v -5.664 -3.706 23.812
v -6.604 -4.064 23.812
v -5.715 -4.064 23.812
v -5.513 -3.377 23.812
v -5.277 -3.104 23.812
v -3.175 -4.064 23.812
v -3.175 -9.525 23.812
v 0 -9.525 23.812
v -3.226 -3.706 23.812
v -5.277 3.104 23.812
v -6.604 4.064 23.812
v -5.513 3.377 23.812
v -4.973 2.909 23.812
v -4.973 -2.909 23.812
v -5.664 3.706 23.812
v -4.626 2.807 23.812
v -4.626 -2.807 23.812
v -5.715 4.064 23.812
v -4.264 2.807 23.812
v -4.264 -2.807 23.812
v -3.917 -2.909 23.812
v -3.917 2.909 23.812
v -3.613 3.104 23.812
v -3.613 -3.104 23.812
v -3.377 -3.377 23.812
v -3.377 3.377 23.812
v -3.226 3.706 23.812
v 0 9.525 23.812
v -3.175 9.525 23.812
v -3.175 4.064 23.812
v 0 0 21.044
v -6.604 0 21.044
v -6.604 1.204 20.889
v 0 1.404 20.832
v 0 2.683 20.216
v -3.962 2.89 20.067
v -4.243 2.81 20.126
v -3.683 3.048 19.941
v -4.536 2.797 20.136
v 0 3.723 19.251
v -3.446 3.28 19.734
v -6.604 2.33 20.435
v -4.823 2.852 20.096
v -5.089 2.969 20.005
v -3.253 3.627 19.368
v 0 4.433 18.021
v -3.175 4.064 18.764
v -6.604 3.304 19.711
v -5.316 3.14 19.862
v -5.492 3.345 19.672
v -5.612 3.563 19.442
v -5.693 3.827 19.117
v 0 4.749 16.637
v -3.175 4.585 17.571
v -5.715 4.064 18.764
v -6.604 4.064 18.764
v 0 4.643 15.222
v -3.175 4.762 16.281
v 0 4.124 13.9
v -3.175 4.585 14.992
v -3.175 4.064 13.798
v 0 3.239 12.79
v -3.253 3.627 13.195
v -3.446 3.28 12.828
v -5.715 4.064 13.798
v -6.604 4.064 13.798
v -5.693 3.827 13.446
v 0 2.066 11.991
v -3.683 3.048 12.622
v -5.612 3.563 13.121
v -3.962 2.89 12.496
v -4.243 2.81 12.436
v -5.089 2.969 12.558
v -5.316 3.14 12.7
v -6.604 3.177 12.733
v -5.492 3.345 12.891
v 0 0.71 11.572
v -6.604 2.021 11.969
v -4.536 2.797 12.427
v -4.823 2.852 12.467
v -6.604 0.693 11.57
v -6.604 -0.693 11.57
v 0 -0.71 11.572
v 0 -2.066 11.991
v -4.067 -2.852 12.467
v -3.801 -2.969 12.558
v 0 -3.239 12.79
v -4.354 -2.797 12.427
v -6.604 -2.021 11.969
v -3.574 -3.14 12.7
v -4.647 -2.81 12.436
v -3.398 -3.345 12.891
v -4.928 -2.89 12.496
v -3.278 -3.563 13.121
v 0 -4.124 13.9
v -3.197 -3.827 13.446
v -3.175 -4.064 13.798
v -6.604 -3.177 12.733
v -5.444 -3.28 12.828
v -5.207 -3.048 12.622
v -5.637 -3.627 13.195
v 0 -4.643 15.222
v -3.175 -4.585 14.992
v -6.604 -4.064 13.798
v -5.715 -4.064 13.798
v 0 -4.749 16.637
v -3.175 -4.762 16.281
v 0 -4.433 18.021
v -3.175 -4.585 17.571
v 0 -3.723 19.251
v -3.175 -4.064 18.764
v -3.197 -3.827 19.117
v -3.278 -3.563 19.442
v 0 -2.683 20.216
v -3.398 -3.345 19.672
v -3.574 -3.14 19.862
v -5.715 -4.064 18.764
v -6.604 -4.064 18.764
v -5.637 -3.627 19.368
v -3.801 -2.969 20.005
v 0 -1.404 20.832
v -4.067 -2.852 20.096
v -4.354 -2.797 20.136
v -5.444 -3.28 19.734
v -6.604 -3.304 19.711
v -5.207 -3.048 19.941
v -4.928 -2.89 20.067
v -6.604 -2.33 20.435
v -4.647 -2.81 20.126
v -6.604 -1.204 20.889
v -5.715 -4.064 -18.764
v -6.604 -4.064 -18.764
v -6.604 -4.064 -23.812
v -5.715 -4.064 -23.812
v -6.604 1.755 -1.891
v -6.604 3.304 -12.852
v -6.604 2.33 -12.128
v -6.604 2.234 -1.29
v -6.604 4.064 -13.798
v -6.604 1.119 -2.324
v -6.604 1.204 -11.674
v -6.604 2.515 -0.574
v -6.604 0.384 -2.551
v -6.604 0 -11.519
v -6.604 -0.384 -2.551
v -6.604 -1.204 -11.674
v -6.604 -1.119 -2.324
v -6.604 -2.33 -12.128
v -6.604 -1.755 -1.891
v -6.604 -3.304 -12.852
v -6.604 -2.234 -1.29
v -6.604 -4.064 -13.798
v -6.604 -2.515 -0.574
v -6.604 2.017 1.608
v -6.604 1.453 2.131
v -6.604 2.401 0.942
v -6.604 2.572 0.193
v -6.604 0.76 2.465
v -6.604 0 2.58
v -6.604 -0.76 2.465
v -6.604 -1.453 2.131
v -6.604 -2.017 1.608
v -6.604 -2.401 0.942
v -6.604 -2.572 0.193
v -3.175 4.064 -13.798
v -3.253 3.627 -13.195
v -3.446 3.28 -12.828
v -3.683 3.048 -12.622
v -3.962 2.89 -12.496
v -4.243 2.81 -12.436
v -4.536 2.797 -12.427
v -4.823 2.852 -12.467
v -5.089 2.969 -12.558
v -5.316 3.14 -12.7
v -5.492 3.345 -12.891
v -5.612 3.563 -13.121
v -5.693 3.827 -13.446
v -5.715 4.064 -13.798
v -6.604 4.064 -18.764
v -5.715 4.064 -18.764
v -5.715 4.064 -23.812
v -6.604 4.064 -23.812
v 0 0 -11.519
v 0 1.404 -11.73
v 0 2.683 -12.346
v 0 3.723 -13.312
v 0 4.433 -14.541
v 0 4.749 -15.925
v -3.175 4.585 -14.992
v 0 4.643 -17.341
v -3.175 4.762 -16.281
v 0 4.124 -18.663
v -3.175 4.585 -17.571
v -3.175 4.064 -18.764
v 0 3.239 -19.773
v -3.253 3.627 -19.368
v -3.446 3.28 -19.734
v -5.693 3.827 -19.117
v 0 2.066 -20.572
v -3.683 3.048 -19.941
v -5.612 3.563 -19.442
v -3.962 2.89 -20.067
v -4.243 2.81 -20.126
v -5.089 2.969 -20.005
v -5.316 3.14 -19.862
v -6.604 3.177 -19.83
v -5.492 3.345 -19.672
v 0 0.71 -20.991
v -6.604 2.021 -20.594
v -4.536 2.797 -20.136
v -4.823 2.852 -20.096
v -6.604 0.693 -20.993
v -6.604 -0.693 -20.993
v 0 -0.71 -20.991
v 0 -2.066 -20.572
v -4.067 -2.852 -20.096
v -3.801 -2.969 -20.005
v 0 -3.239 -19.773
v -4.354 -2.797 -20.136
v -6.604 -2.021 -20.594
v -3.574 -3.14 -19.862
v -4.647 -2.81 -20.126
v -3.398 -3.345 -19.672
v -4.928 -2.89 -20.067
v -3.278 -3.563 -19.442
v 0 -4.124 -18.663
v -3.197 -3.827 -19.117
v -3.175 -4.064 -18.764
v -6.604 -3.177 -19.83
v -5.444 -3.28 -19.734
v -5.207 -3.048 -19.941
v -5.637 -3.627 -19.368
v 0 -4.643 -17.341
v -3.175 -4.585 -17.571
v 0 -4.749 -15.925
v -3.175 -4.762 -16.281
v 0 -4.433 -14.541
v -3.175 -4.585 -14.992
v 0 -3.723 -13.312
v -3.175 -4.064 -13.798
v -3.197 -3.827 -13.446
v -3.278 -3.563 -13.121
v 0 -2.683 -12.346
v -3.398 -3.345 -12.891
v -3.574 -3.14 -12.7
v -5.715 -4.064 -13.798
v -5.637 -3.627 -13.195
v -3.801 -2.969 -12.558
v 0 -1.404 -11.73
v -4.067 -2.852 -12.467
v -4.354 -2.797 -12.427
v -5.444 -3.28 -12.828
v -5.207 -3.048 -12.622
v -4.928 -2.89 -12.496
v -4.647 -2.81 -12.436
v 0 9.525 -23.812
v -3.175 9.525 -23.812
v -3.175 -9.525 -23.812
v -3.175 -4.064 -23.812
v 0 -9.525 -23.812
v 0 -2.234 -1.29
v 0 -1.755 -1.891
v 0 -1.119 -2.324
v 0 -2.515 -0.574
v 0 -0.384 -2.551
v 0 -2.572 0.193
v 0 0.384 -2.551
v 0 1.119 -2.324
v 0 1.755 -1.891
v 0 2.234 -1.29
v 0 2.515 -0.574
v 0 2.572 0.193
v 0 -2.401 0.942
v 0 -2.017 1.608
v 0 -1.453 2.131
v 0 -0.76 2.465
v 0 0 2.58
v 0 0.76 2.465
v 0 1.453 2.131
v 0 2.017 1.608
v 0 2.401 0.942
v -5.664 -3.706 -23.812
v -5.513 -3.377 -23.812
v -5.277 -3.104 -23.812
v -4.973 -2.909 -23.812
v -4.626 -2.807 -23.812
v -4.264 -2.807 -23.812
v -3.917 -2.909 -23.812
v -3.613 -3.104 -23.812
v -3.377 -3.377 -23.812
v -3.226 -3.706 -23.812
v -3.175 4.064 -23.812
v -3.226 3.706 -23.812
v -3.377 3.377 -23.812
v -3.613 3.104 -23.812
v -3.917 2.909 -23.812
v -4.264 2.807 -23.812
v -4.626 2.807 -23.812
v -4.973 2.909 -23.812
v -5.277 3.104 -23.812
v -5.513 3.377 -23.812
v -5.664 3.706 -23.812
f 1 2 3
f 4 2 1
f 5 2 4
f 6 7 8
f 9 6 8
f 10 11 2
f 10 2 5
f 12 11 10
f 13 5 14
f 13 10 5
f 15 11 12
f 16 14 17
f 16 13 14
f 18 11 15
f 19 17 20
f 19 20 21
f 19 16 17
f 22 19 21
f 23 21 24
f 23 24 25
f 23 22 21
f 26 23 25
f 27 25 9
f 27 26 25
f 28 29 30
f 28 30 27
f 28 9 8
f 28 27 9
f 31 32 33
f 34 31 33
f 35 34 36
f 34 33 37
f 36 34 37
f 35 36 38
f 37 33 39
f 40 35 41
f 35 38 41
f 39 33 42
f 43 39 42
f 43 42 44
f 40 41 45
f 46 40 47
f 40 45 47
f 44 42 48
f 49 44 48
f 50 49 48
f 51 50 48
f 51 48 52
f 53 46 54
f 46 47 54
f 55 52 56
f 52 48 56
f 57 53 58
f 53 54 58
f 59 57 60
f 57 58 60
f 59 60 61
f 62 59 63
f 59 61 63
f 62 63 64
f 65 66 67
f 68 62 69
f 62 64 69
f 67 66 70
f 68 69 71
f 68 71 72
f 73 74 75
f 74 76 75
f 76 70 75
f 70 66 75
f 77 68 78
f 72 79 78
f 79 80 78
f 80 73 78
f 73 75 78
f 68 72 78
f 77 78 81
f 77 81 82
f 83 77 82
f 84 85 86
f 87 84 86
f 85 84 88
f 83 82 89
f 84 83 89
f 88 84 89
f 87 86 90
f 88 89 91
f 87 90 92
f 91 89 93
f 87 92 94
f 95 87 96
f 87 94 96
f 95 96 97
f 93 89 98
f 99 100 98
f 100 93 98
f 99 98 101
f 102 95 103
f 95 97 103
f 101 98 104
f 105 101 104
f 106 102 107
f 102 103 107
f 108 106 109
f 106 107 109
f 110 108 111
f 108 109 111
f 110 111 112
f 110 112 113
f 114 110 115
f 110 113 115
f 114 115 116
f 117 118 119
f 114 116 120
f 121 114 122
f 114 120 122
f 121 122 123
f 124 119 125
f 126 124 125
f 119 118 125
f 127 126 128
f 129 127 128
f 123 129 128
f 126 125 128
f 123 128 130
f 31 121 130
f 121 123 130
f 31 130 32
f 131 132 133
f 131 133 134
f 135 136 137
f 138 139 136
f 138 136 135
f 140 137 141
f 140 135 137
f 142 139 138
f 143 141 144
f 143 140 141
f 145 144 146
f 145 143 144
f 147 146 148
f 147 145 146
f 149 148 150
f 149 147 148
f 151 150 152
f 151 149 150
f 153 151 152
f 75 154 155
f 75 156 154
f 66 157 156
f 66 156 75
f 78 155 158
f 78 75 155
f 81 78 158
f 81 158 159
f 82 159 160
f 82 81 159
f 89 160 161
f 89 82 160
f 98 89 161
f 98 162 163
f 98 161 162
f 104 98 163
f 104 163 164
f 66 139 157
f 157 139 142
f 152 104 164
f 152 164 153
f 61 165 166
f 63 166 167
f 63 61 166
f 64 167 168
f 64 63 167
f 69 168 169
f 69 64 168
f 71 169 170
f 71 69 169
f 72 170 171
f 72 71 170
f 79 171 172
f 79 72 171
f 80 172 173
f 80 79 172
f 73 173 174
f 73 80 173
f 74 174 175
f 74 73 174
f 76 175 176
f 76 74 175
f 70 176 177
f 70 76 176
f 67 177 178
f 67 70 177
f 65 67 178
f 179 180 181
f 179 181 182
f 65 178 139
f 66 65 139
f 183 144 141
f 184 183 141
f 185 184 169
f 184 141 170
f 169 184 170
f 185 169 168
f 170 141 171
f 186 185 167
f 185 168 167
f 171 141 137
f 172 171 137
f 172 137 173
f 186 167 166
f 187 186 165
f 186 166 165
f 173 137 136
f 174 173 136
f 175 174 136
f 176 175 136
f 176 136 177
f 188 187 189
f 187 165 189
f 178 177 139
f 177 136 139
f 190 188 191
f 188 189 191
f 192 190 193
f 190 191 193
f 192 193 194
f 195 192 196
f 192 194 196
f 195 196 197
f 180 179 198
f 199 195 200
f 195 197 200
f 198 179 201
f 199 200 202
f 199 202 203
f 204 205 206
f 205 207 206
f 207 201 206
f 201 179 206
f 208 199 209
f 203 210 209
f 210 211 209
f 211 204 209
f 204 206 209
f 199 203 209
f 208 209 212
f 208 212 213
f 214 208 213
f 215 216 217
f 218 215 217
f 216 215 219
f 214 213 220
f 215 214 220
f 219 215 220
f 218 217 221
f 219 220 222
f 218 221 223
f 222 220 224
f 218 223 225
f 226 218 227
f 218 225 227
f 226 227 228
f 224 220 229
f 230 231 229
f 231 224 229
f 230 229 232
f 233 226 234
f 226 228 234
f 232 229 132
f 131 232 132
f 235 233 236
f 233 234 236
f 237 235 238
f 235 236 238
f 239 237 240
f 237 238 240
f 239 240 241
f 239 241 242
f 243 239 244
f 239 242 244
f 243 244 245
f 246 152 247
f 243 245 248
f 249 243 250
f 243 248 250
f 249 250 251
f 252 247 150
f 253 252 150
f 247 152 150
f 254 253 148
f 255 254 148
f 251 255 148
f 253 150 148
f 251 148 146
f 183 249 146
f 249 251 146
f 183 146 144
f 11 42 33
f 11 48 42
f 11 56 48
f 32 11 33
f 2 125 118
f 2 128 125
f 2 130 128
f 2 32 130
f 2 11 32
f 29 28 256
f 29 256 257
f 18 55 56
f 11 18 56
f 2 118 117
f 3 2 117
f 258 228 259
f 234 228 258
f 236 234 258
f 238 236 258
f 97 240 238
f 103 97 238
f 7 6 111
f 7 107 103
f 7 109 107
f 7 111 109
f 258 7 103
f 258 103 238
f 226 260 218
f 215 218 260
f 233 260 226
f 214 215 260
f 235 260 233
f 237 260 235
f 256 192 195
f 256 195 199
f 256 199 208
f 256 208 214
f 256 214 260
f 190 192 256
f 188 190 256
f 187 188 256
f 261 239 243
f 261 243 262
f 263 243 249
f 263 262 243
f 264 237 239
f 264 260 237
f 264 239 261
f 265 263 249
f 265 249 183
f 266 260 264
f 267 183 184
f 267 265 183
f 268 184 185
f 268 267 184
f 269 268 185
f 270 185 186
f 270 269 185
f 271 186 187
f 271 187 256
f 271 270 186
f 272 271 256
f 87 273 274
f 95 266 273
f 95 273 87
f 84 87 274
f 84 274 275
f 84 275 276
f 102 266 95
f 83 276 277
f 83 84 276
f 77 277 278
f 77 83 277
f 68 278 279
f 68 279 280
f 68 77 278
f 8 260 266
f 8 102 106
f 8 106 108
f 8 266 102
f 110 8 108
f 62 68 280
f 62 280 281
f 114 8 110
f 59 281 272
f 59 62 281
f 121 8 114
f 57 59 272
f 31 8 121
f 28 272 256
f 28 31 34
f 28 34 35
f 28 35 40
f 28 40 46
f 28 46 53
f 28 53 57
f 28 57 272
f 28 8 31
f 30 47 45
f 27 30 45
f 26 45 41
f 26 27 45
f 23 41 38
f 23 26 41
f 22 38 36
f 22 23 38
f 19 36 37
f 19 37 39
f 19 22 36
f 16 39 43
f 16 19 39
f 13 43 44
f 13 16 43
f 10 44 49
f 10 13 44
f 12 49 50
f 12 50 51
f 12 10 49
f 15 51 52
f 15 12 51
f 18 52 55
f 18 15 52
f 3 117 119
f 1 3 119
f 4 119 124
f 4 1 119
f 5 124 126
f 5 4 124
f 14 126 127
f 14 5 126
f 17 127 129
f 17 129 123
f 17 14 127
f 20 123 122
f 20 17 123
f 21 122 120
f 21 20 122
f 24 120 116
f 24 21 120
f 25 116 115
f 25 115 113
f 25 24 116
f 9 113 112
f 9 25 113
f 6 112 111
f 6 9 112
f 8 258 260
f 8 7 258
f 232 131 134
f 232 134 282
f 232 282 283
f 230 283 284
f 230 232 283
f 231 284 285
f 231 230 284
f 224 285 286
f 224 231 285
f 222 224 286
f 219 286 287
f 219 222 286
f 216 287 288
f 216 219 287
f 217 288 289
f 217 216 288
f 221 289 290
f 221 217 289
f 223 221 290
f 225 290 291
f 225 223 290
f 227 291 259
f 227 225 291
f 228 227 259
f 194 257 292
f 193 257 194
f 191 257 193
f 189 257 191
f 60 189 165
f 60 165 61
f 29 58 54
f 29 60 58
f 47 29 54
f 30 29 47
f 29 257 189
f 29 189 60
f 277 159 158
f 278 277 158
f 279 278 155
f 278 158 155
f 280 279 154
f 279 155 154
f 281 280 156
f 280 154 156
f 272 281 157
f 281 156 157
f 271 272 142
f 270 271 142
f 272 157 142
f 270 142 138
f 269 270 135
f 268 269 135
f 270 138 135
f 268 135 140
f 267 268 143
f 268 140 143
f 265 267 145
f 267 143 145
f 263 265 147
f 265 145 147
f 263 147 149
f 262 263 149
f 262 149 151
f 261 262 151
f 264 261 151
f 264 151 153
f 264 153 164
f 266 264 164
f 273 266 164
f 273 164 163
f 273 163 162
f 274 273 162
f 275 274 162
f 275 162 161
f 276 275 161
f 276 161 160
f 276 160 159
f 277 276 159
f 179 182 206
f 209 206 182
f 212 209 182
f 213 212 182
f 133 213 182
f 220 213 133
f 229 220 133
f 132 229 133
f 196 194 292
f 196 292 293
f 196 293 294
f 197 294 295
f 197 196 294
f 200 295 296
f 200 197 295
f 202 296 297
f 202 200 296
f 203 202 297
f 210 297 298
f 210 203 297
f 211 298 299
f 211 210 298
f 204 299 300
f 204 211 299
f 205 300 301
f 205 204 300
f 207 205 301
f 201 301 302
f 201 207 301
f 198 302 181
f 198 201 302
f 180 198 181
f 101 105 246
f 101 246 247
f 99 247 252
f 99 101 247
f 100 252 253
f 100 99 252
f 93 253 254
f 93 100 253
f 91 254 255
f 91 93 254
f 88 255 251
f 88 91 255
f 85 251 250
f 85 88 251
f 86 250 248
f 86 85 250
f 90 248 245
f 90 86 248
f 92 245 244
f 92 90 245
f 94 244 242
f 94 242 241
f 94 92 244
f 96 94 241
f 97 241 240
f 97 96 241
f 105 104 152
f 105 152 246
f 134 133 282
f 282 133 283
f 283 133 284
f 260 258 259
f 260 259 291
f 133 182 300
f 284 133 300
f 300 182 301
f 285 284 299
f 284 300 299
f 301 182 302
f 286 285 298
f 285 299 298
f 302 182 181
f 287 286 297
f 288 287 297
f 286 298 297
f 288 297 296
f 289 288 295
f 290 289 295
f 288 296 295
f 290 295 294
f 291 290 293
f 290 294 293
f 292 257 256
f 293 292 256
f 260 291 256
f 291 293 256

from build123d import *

# Parameters (mm, degrees)
BOSS_EXTRUDE1_DEPTH = 23.8125
SKETCH2_R           = 2.5796875
CUT_EXTRUDE1_DEPTH  = 7.604
SKETCH3_R           = 4.7625
CUT_EXTRUDE2_DEPTH  = 7.604


with BuildPart() as part:
    # Sketch1 → Boss-Extrude1 (new body, symmetric)
    with BuildSketch(Plane.XY):
        with BuildLine():
            Line((0, -9.525), (0, 9.525))
            Line((0, 9.525), (-3.175, 9.525))
            Line((-3.175, 9.525), (-3.175, 4.064))
            ThreePointArc((-3.175, 4.064), (-4.445, 2.794), (-5.715, 4.064))
            Line((-5.715, 4.064), (-6.604, 4.064))
            Line((-6.604, 4.064), (-6.604, -4.064))
            Line((-6.604, -4.064), (-5.715, -4.064))
            ThreePointArc((-5.715, -4.064), (-4.445, -2.794), (-3.175, -4.064))
            Line((-3.175, -4.064), (-3.175, -9.525))
            Line((-3.175, -9.525), (0, -9.525))
        make_face()
    extrude(amount=BOSS_EXTRUDE1_DEPTH, both=True)

    # Sketch2 → Cut-Extrude1 (cut, through all)
    with BuildSketch(Plane.ZY.offset(6.604)):
        with Locations((16.2814, 0)):
            Circle(SKETCH2_R)
        with Locations((-16.2814, 0)):
            Circle(SKETCH2_R)
        Circle(SKETCH2_R)
    extrude(amount=-CUT_EXTRUDE1_DEPTH, mode=Mode.SUBTRACT)

    # Sketch3 → Cut-Extrude2 (cut, through all)
    with BuildSketch(Plane.ZY.offset(6.604)):
        with Locations((-16.2814, 0)):
            Circle(SKETCH3_R)
        with Locations((16.2814, 0)):
            Circle(SKETCH3_R)
    extrude(amount=-CUT_EXTRUDE2_DEPTH, mode=Mode.SUBTRACT)


solid = part.part
